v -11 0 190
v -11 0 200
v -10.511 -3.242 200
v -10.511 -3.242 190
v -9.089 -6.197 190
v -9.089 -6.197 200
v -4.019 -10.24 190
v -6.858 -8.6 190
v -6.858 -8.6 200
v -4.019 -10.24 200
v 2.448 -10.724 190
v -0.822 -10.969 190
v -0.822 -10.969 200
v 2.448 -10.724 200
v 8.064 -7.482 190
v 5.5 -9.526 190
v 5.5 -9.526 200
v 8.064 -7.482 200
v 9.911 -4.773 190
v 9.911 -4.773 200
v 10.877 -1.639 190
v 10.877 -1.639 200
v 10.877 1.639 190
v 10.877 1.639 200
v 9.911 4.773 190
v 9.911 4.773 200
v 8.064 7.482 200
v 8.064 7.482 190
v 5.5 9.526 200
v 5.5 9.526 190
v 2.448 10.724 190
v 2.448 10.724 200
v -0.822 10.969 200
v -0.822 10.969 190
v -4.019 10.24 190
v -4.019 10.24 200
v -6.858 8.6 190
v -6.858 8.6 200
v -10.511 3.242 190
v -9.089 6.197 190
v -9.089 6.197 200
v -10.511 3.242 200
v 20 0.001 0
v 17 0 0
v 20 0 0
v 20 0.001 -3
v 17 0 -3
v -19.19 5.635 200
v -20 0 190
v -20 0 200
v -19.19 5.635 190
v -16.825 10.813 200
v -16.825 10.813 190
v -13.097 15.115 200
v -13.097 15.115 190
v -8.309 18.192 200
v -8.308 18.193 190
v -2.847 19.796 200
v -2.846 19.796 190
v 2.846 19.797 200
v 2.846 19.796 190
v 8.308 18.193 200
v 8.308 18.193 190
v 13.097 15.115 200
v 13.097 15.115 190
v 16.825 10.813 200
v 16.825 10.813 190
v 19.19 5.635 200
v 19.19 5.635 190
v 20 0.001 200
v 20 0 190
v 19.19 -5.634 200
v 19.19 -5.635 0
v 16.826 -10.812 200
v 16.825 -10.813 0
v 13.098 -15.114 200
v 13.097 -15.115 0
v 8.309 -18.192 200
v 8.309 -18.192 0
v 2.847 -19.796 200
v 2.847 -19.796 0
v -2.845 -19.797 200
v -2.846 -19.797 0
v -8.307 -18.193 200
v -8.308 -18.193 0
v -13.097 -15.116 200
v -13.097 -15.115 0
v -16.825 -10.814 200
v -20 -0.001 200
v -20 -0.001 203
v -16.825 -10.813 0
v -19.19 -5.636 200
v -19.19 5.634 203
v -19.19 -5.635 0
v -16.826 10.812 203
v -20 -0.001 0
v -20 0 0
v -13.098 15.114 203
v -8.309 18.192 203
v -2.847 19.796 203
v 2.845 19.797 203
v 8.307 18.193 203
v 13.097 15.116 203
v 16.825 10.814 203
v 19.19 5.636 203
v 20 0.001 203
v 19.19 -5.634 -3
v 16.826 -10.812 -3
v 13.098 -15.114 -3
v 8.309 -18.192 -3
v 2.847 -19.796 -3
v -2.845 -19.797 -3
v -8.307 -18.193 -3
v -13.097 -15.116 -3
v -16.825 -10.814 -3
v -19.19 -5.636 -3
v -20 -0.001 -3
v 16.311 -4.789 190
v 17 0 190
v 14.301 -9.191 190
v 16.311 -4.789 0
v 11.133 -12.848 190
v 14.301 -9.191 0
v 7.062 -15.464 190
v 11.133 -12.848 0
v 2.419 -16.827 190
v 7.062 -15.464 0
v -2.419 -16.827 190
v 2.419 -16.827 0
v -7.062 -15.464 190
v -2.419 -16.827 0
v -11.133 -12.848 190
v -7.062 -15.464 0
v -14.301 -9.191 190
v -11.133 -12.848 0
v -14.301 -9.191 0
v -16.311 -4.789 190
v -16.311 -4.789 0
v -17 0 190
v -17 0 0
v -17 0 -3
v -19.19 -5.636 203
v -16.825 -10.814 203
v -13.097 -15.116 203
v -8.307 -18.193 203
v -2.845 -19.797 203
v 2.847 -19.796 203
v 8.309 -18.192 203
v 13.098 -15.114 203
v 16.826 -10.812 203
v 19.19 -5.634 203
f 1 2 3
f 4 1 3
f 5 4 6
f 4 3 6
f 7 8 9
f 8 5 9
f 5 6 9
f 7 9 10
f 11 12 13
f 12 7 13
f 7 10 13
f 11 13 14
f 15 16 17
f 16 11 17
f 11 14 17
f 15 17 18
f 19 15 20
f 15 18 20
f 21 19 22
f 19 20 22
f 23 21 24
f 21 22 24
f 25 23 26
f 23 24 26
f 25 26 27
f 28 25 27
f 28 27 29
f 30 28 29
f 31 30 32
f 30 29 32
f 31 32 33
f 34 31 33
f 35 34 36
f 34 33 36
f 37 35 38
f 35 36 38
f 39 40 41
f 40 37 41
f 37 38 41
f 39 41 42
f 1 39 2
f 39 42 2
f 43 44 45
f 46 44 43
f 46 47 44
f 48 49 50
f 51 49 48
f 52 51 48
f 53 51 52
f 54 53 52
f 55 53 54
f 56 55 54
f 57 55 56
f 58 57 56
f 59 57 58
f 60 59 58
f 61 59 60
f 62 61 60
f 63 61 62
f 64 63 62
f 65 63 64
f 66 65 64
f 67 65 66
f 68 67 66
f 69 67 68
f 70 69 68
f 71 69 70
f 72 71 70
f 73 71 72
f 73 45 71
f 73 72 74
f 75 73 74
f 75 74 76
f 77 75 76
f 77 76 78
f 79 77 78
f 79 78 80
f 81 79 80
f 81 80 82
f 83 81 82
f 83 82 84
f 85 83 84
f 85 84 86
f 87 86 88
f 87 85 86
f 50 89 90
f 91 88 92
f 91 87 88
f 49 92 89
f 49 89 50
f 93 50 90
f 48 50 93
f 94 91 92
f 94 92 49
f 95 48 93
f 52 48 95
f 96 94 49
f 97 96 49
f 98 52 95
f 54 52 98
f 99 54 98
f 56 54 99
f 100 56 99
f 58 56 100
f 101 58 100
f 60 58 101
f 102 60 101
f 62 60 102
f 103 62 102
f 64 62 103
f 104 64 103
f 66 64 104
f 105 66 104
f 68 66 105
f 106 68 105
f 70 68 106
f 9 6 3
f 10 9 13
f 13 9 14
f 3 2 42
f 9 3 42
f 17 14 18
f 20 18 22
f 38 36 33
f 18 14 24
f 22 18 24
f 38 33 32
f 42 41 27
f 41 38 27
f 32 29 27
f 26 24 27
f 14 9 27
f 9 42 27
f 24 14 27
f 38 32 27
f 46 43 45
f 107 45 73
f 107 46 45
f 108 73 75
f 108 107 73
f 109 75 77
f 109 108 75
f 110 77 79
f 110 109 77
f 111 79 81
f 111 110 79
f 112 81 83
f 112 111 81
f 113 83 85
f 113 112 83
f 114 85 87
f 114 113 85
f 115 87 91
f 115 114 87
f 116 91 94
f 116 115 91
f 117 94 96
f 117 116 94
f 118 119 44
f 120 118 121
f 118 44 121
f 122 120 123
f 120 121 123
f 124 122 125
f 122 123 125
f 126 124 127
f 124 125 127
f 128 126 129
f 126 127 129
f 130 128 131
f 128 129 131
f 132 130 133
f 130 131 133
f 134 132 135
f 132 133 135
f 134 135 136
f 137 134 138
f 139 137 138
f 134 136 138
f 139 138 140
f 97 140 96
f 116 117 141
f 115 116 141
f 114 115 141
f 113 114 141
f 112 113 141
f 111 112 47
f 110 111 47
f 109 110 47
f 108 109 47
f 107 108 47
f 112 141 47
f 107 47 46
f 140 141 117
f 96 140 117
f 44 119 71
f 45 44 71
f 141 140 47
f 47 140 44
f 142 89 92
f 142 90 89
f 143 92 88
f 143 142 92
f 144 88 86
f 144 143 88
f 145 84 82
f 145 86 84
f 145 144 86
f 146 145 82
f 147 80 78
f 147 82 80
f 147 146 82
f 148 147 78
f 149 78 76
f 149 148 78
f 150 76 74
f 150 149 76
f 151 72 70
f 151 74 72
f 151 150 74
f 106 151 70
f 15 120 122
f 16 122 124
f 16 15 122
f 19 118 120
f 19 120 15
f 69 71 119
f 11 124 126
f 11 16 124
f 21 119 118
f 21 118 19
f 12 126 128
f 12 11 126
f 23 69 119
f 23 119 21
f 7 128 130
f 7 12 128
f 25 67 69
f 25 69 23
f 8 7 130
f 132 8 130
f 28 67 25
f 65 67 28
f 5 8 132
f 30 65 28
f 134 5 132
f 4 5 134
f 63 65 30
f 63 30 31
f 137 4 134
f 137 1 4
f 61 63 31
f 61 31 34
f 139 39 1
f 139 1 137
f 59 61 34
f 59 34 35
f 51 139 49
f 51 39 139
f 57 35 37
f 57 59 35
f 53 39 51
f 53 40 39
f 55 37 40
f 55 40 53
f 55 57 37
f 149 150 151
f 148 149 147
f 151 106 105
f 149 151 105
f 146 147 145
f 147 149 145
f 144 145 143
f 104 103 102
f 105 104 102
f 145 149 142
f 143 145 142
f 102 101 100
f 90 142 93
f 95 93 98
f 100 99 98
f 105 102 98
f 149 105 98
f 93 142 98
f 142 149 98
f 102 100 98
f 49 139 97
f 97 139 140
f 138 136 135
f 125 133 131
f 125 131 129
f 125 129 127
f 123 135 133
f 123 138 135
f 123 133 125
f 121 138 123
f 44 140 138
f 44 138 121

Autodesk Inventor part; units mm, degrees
ref_plane "YZ Plane" through (0, 0, 0) normal (1, 0, 0) x (0, 1, 0)
ref_plane "XZ Plane" through (0, 0, 0) normal (0, 1, 0) x (-1, 0, 0)
ref_plane "XY Plane" through (0, 0, 0) normal (0, 0, 1) x (1, 0, 0)
sketch "Sketch1" plane through (0, 0, 0) normal (0, 0, 1) x (1, 0, 0)
  arc A0 (-17, 0) -> (17, 0) centre (0, 0) ccw
  line L0 (-23.8, 0) -> (23.8, 0) projected
  line L1 (-17, 0) -> (17, 0)
  dimension "d1" = 17
extrude "Extrusion1" add sketch "Sketch1" along normal blind 200
shell "Shell1" thickness 3 outward yes removed faces 1 at (5.6667, 0, 66.6667)
sketch "Sketch2" plane through (0, 0, 200) normal (0, 0, -1) x (-1, 0, 0)
  circle A0 centre (0, 0) radius 20
  arc A1 (-20, 0) -> (20, 0) centre (0, 0) ccw projected
extrude "Extrusion2" add sketch "Sketch2" against normal up to surface (3 mm away)
sketch "Sketch3" plane through (0, 0, 200) normal (0, 0, -1) x (-1, 0, 0)
  circle A0 centre (0, 0) radius 11
  circle A1 centre (0, 0) radius 20
  circle A2 centre (0, 0) radius 20 projected
  dimension "d7" = 22
extrude "Extrusion3" add sketch "Sketch3" along normal blind 10
properties part number "prototype3"
